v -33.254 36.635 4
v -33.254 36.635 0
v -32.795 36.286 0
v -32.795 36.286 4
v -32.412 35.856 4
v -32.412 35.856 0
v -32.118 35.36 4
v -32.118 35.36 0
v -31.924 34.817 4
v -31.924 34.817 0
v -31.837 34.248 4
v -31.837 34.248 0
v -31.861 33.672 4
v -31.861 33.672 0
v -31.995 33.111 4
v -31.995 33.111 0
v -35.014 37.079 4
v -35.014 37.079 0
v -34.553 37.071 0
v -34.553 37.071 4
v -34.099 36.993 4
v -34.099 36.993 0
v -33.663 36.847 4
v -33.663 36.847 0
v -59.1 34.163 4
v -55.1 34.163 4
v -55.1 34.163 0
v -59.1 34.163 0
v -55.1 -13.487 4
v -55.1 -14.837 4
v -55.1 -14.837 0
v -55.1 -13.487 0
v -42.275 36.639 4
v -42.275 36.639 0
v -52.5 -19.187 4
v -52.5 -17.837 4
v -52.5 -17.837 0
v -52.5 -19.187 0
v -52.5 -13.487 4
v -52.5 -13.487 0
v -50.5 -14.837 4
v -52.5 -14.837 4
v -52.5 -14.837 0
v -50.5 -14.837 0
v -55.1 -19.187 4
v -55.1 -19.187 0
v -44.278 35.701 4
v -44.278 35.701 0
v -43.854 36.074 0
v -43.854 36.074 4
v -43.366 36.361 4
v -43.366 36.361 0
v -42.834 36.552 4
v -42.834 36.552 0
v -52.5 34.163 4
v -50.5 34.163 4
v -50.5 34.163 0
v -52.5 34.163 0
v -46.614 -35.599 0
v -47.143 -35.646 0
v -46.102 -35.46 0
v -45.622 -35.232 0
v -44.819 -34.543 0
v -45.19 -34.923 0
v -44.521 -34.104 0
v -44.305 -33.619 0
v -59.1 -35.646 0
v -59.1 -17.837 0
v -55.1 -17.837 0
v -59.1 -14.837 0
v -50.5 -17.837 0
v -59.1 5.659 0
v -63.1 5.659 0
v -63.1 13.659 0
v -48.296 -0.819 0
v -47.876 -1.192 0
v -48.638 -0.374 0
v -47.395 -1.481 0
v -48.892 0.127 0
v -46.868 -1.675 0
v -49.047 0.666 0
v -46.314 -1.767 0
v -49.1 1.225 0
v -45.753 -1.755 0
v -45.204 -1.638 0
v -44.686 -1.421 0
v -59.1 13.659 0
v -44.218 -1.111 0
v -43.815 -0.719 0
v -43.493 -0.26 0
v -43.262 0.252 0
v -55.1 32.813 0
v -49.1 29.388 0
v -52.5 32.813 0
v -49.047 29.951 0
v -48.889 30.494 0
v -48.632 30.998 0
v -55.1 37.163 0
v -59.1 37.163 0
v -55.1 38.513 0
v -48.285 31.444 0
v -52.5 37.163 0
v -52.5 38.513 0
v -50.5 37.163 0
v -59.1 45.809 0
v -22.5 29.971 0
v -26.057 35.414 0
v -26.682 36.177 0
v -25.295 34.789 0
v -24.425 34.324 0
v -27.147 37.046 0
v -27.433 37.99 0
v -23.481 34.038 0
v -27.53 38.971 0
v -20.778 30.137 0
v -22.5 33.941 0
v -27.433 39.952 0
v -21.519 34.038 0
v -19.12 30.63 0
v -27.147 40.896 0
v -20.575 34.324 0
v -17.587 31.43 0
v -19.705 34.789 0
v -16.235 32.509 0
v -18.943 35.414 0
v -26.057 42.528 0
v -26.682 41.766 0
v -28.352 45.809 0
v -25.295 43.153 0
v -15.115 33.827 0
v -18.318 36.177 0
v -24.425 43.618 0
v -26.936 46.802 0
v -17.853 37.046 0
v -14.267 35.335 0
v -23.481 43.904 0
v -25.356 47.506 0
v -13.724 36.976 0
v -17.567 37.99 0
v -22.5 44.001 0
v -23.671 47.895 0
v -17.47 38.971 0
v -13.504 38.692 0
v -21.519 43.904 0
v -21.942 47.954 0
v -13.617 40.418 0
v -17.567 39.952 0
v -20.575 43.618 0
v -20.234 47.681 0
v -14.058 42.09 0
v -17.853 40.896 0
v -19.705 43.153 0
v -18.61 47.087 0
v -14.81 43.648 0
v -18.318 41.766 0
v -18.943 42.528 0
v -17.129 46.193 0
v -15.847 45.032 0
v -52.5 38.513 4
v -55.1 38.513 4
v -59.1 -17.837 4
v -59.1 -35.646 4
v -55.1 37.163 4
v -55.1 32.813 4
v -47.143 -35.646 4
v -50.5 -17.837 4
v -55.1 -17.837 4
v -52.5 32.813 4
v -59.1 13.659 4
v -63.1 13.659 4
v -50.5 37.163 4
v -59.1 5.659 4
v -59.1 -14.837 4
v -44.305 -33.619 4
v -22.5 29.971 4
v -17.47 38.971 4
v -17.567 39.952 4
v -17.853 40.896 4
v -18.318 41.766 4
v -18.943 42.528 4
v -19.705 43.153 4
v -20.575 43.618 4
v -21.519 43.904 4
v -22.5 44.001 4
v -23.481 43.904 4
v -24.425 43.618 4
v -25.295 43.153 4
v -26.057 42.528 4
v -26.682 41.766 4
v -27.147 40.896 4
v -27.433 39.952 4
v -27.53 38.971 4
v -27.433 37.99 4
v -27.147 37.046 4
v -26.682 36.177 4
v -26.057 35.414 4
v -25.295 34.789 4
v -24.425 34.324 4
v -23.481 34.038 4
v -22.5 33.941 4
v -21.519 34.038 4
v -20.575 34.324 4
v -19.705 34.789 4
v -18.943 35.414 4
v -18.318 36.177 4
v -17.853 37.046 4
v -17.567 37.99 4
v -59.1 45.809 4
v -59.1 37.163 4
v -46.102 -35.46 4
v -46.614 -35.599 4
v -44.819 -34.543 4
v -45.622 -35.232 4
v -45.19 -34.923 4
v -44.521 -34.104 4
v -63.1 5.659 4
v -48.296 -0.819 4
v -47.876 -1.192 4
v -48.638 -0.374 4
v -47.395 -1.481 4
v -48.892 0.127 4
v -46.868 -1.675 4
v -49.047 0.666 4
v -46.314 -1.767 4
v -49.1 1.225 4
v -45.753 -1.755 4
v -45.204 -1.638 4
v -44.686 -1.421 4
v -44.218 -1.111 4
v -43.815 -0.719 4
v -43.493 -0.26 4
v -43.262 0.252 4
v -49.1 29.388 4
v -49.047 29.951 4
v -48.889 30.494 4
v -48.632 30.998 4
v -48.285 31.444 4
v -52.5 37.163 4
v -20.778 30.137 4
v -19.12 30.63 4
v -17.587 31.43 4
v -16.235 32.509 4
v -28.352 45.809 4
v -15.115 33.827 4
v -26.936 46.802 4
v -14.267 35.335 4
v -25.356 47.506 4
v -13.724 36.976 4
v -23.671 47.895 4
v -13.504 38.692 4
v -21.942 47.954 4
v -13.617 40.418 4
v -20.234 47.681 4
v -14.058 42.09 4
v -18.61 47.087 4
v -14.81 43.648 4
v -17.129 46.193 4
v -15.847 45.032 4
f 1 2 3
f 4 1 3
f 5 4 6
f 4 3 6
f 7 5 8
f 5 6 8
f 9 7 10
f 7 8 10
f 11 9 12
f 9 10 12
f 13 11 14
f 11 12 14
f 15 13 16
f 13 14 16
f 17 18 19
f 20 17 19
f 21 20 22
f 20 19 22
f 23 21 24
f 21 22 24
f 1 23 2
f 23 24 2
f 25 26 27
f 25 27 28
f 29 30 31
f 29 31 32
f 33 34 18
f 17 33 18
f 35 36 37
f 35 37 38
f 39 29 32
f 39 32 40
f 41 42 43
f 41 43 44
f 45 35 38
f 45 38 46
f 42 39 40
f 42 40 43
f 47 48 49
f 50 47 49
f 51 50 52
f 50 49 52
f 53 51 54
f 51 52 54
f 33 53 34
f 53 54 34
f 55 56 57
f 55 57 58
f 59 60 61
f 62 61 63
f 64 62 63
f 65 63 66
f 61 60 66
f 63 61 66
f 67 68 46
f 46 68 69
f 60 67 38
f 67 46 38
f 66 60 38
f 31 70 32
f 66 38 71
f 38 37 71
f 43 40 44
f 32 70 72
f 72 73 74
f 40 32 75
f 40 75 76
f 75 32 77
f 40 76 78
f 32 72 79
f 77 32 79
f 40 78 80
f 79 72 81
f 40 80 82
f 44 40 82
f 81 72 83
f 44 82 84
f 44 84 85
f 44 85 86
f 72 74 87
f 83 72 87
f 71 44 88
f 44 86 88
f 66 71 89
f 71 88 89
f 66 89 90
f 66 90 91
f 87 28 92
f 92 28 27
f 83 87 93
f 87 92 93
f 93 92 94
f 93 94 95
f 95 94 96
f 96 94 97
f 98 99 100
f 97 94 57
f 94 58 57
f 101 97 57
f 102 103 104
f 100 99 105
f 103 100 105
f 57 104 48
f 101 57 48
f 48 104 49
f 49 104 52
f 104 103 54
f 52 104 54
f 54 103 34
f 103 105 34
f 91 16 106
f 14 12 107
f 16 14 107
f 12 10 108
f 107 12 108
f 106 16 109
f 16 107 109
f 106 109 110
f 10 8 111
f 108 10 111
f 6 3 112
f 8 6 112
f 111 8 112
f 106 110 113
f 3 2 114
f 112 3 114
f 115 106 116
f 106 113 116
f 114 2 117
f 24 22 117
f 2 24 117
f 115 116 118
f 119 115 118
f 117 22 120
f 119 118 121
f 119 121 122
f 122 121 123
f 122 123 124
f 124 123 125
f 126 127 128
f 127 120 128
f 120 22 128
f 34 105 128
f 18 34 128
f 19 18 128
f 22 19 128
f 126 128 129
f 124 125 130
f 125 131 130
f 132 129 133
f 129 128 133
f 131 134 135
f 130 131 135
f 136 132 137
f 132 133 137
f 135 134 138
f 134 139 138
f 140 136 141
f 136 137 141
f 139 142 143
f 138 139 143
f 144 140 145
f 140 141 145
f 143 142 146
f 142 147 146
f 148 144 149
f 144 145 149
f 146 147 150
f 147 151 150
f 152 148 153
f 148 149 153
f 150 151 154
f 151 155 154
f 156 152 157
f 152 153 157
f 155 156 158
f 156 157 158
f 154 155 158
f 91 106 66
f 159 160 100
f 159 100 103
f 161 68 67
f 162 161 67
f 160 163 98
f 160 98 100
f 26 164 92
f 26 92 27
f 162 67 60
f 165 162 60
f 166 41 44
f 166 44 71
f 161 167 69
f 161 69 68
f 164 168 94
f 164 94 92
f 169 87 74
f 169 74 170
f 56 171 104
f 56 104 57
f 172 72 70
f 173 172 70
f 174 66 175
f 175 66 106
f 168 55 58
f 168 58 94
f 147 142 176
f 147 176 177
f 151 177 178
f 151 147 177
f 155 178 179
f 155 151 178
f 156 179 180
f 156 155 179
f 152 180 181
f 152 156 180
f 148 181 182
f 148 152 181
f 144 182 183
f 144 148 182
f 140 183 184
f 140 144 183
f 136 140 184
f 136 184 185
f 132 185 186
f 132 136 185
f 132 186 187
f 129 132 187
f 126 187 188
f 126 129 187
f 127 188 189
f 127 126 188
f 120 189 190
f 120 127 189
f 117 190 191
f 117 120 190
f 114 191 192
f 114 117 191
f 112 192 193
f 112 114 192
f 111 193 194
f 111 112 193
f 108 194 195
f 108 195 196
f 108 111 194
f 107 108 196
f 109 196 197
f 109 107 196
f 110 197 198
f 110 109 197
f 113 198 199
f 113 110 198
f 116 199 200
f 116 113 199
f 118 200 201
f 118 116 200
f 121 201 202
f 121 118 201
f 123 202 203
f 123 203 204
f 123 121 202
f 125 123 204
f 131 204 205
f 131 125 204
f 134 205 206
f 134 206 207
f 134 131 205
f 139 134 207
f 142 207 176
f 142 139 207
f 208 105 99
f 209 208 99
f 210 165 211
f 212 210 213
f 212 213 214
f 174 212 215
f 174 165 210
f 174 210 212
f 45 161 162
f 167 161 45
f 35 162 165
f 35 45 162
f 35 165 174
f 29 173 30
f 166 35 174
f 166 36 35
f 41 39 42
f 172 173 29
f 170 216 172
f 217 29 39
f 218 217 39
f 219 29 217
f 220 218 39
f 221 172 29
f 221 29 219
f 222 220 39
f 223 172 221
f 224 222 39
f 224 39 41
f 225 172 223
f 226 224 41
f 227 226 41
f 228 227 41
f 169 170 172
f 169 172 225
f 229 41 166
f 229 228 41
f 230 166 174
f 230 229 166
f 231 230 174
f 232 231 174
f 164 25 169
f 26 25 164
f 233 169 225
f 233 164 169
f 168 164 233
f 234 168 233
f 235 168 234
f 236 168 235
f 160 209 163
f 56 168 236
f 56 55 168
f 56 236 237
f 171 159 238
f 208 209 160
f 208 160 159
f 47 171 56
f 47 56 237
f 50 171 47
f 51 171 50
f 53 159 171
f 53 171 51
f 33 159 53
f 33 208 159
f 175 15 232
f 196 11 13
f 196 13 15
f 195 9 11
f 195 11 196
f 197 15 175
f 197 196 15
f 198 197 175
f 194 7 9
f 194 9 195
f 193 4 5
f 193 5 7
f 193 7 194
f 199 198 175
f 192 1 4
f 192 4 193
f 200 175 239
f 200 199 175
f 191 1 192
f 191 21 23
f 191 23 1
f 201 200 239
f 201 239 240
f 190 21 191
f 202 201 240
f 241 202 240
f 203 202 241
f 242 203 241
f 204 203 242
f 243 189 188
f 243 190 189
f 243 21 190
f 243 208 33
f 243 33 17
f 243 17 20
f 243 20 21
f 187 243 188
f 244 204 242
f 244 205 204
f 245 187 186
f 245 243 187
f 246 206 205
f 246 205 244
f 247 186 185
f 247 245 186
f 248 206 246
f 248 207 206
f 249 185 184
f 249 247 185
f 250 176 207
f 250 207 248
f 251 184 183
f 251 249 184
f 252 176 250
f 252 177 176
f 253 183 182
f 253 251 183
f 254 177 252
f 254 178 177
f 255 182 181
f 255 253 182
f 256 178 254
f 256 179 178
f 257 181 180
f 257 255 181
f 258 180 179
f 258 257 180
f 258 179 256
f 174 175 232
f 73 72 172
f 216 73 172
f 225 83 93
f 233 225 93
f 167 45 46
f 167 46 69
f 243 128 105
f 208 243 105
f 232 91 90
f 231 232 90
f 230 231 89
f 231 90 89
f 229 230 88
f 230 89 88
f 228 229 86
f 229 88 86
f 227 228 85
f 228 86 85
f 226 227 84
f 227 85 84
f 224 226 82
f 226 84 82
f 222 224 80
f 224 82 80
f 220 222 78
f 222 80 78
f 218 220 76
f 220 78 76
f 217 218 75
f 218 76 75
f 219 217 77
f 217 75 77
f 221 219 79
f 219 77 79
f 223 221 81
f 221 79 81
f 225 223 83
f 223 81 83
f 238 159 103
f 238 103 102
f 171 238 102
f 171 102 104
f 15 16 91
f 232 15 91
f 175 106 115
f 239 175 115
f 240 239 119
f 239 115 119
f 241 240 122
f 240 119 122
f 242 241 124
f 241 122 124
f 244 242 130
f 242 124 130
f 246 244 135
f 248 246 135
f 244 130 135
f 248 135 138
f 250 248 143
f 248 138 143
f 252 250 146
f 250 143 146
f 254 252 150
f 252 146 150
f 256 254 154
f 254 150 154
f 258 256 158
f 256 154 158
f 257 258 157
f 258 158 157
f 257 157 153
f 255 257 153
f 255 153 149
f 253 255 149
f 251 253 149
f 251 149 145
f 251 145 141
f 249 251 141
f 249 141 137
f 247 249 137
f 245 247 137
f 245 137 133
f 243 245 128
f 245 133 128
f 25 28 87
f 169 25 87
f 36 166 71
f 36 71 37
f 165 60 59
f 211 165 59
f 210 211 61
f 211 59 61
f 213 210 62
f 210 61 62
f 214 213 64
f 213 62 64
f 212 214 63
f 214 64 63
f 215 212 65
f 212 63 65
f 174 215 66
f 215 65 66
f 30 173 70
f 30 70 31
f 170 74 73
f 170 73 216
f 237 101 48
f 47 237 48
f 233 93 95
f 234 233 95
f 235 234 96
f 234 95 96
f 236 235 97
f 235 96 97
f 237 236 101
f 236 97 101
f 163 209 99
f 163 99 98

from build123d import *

# Parameters (mm, degrees)
SKETCH_1_R          = 5.03
EXTRUDE_1_DEPTH     = 4
CUT_EXTRUDE_1_DEPTH = 4
SKETCH_4_W          = 4
SKETCH_4_H          = 8
EXTRUDE_2_DEPTH     = 4


with BuildPart() as part:
    # 草图1 → 凸台-拉伸1 (new body)
    with BuildSketch(Plane.XY):
        with BuildLine():
            Line((-59.1, 38.97114317), (-59.1, 2.206540881))
            Line((-59.1, 2.206540881), (-59.1, -35.646026533))
            Line((-59.1, -35.646026533), (-47.142774211, -35.646026533))
            ThreePointArc((-47.142774211, -35.646026533), (-45.399104316, -35.087258865), (-44.304971996, -33.619103399))
            Line((-44.304971996, -33.619103399), (-22.5, 29.97114317))
            ThreePointArc((-22.5, 29.97114317), (-14.057833007, 42.090408542), (-28.351857593, 45.808961734))
            Line((-28.351857593, 45.808961734), (-56.281374572, 45.808961734))
            Line((-56.281374572, 45.808961734), (-59.1, 45.808961734))
            Line((-59.1, 45.808961734), (-59.1, 42.814449543))
            Line((-59.1, 42.814449543), (-59.1, 38.97114317))
        make_face()
        with BuildLine():
            ThreePointArc((-35.014022641, 37.07877749), (-34.09949662, 36.993301041), (-33.253696548, 36.635130268))
            ThreePointArc((-33.253696548, 36.635130268), (-32.007498532, 35.093487817), (-31.994845854, 33.111188432))
            Line((-31.994845854, 33.111188432), (-43.262197785, 0.251999821))
            ThreePointArc((-43.262197785, 0.251999821), (-46.59325113, -1.734096056), (-49.1, 1.225076687))
            Line((-49.1, 1.225076687), (-49.1, 15.527048957))
            Line((-49.1, 15.527048957), (-49.1, 29.38821049))
            ThreePointArc((-49.1, 29.38821049), (-48.888683815, 30.494213466), (-48.284504946, 31.444405555))
            Line((-48.284504946, 31.444405555), (-44.278244198, 35.700663421))
            ThreePointArc((-44.278244198, 35.700663421), (-43.366317827, 36.361183979), (-42.275113824, 36.638980548))
            Line((-42.275113824, 36.638980548), (-35.014022641, 37.07877749))
        make_face(mode=Mode.SUBTRACT)
        with Locations((-22.5, 38.97114317)):
            Circle(SKETCH_1_R, mode=Mode.SUBTRACT)
    extrude(amount=EXTRUDE_1_DEPTH)

    # 草图2 → 切除-拉伸1 (cut)
    with BuildSketch(Plane.XY.offset(4)):
        Polygon((-59.1, -14.837441681), (-55.1, -14.837441681), (-55.1, -13.487441681), (-52.5, -13.487441681), (-52.5, -14.837441681), (-50.5, -14.837441681), (-50.5, -17.837441681), (-52.5, -17.837441681), (-52.5, -19.187441681), (-55.1, -19.187441681), (-55.1, -17.837441681), (-59.1, -17.837441681), align=None)
        Polygon((-59.1, 37.162558319), (-55.1, 37.162558319), (-55.1, 38.512558319), (-52.5, 38.512558319), (-52.5, 37.162558319), (-50.5, 37.162558319), (-50.5, 34.162558319), (-52.5, 34.162558319), (-52.5, 32.812558319), (-55.1, 32.812558319), (-55.1, 34.162558319), (-59.1, 34.162558319), align=None)
    extrude(amount=-CUT_EXTRUDE_1_DEPTH, mode=Mode.SUBTRACT)

    # 草图4 → 凸台-拉伸2 (add)
    with BuildSketch(Plane.ZY.offset(59.1)):
        with Locations((2, 9.659412515)):
            Rectangle(SKETCH_4_W, SKETCH_4_H)
    extrude(amount=EXTRUDE_2_DEPTH)


solid = part.part
